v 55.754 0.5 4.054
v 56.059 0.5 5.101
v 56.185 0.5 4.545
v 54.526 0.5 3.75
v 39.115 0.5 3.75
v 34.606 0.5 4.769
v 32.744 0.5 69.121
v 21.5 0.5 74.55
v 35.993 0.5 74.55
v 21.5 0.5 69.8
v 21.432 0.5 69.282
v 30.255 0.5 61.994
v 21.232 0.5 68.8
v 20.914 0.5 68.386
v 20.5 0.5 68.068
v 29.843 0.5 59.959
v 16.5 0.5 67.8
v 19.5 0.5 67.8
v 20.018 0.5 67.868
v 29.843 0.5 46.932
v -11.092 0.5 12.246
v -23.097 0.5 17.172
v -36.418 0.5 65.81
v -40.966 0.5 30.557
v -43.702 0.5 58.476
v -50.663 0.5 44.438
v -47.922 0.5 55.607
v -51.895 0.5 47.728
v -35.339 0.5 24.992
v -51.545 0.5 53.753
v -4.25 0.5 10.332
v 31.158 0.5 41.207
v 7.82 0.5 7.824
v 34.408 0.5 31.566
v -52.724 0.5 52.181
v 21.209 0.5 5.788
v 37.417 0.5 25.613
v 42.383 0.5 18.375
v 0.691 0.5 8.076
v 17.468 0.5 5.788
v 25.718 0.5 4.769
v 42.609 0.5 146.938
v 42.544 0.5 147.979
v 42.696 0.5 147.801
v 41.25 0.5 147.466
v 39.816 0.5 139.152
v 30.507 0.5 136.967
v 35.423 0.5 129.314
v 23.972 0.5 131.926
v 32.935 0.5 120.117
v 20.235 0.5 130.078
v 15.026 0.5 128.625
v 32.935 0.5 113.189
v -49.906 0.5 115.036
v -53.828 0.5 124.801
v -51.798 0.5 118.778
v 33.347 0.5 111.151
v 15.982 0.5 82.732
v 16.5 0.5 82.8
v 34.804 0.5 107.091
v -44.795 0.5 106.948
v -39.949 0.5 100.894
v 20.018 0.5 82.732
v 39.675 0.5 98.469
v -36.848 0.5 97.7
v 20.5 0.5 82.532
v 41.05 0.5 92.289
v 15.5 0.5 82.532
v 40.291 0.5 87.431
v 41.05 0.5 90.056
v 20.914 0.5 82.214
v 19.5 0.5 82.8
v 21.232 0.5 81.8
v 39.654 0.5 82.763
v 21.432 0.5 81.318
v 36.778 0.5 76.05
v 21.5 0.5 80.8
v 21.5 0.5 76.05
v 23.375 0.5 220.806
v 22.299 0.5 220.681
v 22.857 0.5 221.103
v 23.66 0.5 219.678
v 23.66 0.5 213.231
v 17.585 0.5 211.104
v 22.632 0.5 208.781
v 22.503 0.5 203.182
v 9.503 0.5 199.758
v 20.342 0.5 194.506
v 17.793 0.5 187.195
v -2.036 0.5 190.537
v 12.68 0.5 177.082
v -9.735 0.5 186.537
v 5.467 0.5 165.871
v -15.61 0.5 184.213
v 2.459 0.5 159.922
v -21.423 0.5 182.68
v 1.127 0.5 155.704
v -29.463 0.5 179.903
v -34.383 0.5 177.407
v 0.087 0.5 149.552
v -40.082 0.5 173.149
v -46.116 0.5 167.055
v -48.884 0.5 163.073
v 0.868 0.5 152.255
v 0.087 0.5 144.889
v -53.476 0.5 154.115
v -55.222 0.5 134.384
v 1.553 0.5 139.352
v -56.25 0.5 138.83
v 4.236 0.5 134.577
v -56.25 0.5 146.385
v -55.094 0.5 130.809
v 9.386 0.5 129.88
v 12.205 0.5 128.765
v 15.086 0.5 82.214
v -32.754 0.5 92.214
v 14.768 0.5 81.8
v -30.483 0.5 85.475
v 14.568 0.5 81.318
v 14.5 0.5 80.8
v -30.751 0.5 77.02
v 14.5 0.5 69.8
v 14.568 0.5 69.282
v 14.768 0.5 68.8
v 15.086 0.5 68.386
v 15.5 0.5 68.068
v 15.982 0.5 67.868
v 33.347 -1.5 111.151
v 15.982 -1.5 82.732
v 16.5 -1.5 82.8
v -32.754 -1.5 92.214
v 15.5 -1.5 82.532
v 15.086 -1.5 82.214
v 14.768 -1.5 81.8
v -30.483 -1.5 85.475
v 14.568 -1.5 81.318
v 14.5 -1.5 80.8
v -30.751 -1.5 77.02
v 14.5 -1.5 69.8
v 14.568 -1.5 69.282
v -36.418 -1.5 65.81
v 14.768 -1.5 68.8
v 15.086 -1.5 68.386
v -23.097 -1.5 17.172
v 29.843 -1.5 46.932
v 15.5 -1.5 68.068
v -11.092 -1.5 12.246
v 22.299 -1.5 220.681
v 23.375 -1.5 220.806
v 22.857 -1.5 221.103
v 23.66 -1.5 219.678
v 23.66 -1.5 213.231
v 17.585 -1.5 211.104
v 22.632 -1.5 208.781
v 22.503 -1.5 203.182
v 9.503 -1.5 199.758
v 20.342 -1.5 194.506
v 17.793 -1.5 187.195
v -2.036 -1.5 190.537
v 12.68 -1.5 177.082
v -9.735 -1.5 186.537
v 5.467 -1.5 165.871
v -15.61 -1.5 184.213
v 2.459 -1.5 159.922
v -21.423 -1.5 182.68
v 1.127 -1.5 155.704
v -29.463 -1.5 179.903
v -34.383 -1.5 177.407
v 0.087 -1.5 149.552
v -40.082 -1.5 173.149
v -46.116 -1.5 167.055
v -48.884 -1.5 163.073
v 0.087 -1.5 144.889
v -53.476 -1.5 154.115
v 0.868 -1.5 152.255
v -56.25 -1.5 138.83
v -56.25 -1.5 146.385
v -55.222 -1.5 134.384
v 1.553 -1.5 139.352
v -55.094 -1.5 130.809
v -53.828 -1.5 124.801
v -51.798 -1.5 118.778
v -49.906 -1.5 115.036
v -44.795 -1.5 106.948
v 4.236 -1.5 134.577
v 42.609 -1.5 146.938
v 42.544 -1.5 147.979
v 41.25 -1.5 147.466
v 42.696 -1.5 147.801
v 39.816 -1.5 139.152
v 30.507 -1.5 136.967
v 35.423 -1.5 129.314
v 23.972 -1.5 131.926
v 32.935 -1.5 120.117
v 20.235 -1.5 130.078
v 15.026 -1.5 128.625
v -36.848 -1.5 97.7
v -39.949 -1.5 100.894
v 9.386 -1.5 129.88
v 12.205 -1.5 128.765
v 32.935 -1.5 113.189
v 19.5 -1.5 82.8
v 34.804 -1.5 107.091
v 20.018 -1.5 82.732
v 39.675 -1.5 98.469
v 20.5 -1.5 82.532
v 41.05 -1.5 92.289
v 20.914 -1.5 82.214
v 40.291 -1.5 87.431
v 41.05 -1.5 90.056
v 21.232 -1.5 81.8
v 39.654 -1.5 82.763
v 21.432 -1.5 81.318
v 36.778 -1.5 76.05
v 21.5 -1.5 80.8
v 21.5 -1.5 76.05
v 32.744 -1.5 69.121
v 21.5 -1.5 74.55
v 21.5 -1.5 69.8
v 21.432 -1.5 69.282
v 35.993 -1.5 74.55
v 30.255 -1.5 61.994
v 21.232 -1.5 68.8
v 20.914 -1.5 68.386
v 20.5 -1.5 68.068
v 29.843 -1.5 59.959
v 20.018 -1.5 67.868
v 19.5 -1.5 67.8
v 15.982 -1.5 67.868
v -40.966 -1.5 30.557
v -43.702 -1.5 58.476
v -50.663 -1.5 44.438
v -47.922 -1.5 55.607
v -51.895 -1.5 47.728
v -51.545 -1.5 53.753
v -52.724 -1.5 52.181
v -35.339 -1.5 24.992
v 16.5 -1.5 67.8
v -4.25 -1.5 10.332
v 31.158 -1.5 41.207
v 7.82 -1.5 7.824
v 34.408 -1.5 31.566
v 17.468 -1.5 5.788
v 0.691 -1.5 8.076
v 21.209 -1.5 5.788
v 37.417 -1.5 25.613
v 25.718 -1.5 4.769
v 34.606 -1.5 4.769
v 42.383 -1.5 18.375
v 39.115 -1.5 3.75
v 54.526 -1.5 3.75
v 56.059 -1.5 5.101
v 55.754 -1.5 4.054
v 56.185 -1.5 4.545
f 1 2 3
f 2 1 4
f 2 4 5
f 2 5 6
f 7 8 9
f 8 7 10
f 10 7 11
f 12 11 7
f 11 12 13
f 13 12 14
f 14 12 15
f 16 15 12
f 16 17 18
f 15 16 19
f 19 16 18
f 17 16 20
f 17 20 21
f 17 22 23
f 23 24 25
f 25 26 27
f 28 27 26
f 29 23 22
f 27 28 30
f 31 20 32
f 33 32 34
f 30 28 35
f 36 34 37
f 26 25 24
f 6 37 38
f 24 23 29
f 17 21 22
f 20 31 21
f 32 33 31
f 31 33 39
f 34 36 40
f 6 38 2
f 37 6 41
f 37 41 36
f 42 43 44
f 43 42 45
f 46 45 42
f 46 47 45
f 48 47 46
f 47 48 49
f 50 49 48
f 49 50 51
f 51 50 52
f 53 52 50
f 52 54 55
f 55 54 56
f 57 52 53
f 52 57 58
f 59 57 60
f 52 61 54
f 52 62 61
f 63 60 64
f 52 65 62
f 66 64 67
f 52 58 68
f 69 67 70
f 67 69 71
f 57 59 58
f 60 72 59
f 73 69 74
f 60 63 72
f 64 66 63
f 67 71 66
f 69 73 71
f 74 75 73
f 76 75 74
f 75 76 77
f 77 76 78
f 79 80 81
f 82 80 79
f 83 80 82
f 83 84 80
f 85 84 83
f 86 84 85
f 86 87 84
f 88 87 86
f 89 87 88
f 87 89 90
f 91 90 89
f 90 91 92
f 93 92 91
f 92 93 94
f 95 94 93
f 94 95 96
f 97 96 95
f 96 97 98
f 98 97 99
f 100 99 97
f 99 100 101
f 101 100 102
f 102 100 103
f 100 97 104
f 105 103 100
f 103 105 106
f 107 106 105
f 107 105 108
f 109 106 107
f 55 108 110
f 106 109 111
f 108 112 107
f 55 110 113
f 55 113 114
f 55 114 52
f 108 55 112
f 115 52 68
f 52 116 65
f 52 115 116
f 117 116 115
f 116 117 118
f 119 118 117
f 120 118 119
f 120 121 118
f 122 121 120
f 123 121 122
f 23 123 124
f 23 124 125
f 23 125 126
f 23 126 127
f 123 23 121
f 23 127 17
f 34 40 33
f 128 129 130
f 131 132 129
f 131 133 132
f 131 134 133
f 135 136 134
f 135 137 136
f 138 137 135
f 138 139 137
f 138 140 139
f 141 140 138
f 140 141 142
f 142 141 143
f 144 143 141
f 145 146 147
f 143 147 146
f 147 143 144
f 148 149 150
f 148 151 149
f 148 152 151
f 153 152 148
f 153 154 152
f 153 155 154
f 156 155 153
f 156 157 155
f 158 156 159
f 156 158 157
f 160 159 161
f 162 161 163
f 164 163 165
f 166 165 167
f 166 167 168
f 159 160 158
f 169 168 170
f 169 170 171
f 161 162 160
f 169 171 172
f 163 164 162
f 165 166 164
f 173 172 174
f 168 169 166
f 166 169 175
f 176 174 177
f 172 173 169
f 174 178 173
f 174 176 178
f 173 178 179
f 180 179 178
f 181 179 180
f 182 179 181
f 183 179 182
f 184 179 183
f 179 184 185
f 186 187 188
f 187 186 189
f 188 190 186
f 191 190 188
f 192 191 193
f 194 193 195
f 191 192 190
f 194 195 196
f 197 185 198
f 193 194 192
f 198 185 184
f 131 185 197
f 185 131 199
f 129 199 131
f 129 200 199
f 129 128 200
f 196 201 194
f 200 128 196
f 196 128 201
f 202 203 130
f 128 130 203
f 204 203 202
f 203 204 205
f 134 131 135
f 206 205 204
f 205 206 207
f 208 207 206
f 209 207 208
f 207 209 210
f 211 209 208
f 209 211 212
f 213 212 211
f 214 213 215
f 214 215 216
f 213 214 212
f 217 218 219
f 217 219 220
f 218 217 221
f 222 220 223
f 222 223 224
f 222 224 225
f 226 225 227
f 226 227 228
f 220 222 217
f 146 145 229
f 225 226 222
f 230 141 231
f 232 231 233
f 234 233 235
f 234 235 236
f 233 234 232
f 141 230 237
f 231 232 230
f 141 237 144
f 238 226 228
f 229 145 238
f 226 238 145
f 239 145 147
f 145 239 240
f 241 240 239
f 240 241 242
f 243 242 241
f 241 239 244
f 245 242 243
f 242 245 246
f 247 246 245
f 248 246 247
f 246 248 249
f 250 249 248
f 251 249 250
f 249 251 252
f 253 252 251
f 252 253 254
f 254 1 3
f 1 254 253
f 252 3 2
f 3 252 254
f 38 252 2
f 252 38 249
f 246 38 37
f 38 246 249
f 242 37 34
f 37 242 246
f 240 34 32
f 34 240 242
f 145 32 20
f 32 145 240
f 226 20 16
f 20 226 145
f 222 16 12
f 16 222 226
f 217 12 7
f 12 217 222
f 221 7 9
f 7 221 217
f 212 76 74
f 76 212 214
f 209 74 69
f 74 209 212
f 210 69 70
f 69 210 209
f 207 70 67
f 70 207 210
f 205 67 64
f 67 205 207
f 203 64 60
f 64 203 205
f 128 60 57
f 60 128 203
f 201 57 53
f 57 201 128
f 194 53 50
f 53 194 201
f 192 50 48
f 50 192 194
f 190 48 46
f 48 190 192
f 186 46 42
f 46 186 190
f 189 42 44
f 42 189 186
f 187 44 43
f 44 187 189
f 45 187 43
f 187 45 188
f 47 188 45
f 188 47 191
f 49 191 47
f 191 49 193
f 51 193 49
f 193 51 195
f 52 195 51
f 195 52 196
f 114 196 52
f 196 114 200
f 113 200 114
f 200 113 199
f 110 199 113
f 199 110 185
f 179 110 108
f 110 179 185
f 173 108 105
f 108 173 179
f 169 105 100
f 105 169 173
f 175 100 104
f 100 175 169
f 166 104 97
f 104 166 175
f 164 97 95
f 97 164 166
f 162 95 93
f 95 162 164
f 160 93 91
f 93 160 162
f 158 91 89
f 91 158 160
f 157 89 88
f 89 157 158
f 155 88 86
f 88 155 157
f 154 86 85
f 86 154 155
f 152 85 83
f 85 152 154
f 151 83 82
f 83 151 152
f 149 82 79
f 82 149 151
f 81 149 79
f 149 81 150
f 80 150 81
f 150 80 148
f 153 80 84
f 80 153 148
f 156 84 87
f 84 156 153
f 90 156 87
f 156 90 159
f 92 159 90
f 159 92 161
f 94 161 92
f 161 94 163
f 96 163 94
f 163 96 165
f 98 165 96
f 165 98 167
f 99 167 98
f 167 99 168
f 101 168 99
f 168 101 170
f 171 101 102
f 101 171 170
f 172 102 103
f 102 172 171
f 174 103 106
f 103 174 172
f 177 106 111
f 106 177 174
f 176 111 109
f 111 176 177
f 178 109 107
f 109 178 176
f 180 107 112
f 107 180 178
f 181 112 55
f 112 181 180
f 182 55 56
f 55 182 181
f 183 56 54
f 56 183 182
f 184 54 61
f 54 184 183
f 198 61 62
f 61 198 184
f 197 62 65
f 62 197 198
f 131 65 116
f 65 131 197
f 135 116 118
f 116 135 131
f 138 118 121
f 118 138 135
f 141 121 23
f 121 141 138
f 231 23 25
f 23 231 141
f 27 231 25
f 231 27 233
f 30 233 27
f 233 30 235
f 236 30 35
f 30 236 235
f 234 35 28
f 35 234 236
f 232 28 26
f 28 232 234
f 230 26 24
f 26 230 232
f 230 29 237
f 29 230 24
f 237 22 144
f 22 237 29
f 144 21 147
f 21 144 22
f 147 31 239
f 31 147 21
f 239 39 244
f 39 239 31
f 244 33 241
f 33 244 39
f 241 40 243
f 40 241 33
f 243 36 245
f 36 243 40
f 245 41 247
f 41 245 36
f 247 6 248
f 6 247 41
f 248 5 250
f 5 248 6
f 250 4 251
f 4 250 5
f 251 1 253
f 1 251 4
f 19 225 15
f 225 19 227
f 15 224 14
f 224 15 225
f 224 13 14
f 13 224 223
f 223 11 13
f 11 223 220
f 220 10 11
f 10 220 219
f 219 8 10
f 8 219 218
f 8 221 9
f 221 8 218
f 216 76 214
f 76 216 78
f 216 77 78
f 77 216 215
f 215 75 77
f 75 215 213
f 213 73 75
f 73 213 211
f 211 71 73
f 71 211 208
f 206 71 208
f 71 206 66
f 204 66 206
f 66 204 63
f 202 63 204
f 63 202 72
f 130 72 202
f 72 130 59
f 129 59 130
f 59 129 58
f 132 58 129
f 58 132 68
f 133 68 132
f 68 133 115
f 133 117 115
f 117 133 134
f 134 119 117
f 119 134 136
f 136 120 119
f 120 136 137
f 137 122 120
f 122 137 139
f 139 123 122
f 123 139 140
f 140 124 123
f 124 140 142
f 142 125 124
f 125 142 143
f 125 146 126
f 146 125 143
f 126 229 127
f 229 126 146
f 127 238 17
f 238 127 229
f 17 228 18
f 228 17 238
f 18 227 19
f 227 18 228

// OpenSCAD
// file: shape_pts.scad
// Left Flame ("FL") ? Flanks Top E on Left
// Vertical-display edition: bottom divider clip removed, interlocking hollow double-dovetail channels added.

shape_w = 114.00;
shape_h = 219.00;

rec_snap_top_x = 14.50;
rec_snap_top_z = 126.40;
rec_snap_bot_x = 42.00;

rec_top_conn_enable   = false;
rec_top_conn_x        = 0.00;
rec_bot_conn_enable   = false;
rec_bot_conn_x        = 0.00;
rec_left_conn_enable  = false;
rec_left_conn_z       = 0.00;
rec_left_conn_face_x  = 0.00;
rec_left_conn_pocket_x = 0.00;
rec_right_conn_enable = true;
rec_right_conn_z      = 72.30;
rec_right_conn_face_x = 44.80;
rec_right_conn_pocket_x = 18.00;

rec_magnet_enable = true;
rec_magnet_x      = -30.00;
rec_magnet_z      = 150.45;

rec_wall_mount_enable = false;
rec_wall_mount_x      = 0.00;
rec_wall_mount_z      = 90.00;

rec_include_controller = false;
rec_chip_x     = 12.00;
rec_chip_z     = 62.00;
rec_cable_x    = 12.00;
rec_ziptie_z   = 33.50;
rec_keyhole_z  = 19.50;
rec_slit_dir   = 1;

rec_pillars = [[-18.0, 88.0], [-12.0, 44.0], [-26.0, 128.0], [-12.0, 164.0]];
rec_has_face_grooves = false;

shape_pts = [[56.742,2.484],[42.959,15.861],[38.064,22.996],[35.102,28.856],[31.881,38.411],[30.593,44.017],[30.593,56.884],[30.980,58.795],[33.427,65.802],[37.163,72.045],[40.383,79.561],[41.027,84.275],[41.800,86.950],[41.800,89.371],[40.383,95.741],[35.488,104.404],[34.071,108.353],[33.685,110.264],[33.685,117.017],[36.132,126.062],[40.512,135.872],[43.346,143.771],[43.475,145.045],[42.766,145.873],[40.834,145.108],[30.014,134.534],[23.573,129.565],[19.966,127.782],[14.942,126.380],[12.366,126.508],[9.790,127.527],[4.831,132.050],[2.254,136.636],[0.837,141.987],[0.837,146.446],[1.610,149.121],[1.868,152.561],[3.156,156.638],[6.119,162.498],[13.332,173.709],[18.485,183.901],[21.061,191.291],[23.251,200.081],[23.380,205.687],[24.410,210.146],[24.410,216.771],[24.024,218.299],[22.800,219.000],[21.705,218.172],[16.939,208.490],[8.953,197.278],[-2.447,188.169],[-10.047,184.220],[-15.844,181.927],[-21.641,180.398],[-29.756,177.595],[-34.780,175.047],[-40.576,170.716],[-46.695,164.537],[-49.529,160.460],[-54.166,151.414],[-57.000,143.516],[-57.000,135.744],[-55.969,131.285],[-55.841,127.718],[-54.553,121.603],[-52.492,115.488],[-50.559,111.666],[-45.407,103.512],[-40.512,97.397],[-37.420,94.212],[-33.427,88.861],[-31.237,82.364],[-31.495,74.210],[-37.034,63.254],[-44.183,56.056],[-48.305,53.253],[-52.041,51.342],[-53.522,49.367],[-52.620,44.526],[-51.332,41.086],[-41.542,27.072],[-35.810,21.403],[-23.444,13.504],[-11.336,8.536],[-4.508,6.625],[0.515,4.332],[7.729,4.077],[17.390,2.038],[21.125,2.038],[25.634,1.019],[34.522,1.019],[39.031,0.000],[54.617,0.000],[56.163,0.382],[57.000,1.338]];
shape_paths = [[0, 1, 2, 3, 4, 5, 6, 7, 8, 9, 10, 11, 12, 13, 14, 15, 16, 17, 18, 19, 20, 21, 22, 23, 24, 25, 26, 27, 28, 29, 30, 31, 32, 33, 34, 35, 36, 37, 38, 39, 40, 41, 42, 43, 44, 45, 46, 47, 48, 49, 50, 51, 52, 53, 54, 55, 56, 57, 58, 59, 60, 61, 62, 63, 64, 65, 66, 67, 68, 69, 70, 71, 72, 73, 74, 75, 76, 77, 78, 79, 80, 81, 82, 83, 84, 85, 86, 87, 88, 89, 90, 91, 92, 93, 94, 95]];

diffuser_shape_pts = [[56.742,2.484],[42.959,15.861],[38.064,22.996],[35.102,28.856],[31.881,38.411],[30.593,44.017],[30.593,56.884],[30.980,58.795],[33.427,65.802],[37.163,72.045],[40.383,79.561],[41.027,84.275],[41.800,86.950],[41.800,89.371],[40.383,95.741],[35.488,104.404],[34.071,108.353],[33.685,110.264],[33.685,117.017],[36.132,126.062],[40.512,135.872],[43.346,143.771],[43.475,145.045],[42.766,145.873],[40.834,145.108],[30.014,134.534],[23.573,129.565],[19.966,127.782],[14.942,126.380],[12.366,126.508],[9.790,127.527],[4.831,132.050],[2.254,136.636],[0.837,141.987],[0.837,146.446],[1.610,149.121],[1.868,152.561],[3.156,156.638],[6.119,162.498],[13.332,173.709],[18.485,183.901],[21.061,191.291],[23.251,200.081],[23.380,205.687],[24.410,210.146],[24.410,216.771],[24.024,218.299],[22.800,219.000],[21.705,218.172],[16.939,208.490],[8.953,197.278],[-2.447,188.169],[-10.047,184.220],[-15.844,181.927],[-21.641,180.398],[-29.756,177.595],[-34.780,175.047],[-40.576,170.716],[-46.695,164.537],[-49.529,160.460],[-54.166,151.414],[-57.000,143.516],[-57.000,135.744],[-55.969,131.285],[-55.841,127.718],[-54.553,121.603],[-52.492,115.488],[-50.559,111.666],[-45.407,103.512],[-40.512,97.397],[-37.420,94.212],[-33.427,88.861],[-31.237,82.364],[-31.495,74.210],[-37.034,63.254],[-44.183,56.056],[-48.305,53.253],[-52.041,51.342],[-53.522,49.367],[-52.620,44.526],[-51.332,41.086],[-41.542,27.072],[-35.810,21.403],[-23.444,13.504],[-11.336,8.536],[-4.508,6.625],[0.515,4.332],[7.729,4.077],[17.390,2.038],[21.125,2.038],[25.634,1.019],[34.522,1.019],[39.031,0.000],[54.617,0.000],[56.163,0.382],[57.000,1.338]];
diffuser_shape_paths = [[0, 1, 2, 3, 4, 5, 6, 7, 8, 9, 10, 11, 12, 13, 14, 15, 16, 17, 18, 19, 20, 21, 22, 23, 24, 25, 26, 27, 28, 29, 30, 31, 32, 33, 34, 35, 36, 37, 38, 39, 40, 41, 42, 43, 44, 45, 46, 47, 48, 49, 50, 51, 52, 53, 54, 55, 56, 57, 58, 59, 60, 61, 62, 63, 64, 65, 66, 67, 68, 69, 70, 71, 72, 73, 74, 75, 76, 77, 78, 79, 80, 81, 82, 83, 84, 85, 86, 87, 88, 89, 90, 91, 92, 93, 94, 95]];

module shape_2d(pts = shape_pts) {
    polygon(points = pts, paths = shape_paths);
}

module diffuser_shape_2d(pts = diffuser_shape_pts) {
    polygon(points = pts, paths = diffuser_shape_paths);
}

module diffuser_face_grooves_2d() {}
// main file
// Left Flame ("FL") ? Flanks Top E on Left ? internal white reflector plate (2.00 mm thick, aligned LED-strip conduit pockets + entry slits)
// Opens and exports standalone in OpenSCAD / OpenSCAD.js.

use <lamp_core.scad>

render_lamp_part("reflector");
